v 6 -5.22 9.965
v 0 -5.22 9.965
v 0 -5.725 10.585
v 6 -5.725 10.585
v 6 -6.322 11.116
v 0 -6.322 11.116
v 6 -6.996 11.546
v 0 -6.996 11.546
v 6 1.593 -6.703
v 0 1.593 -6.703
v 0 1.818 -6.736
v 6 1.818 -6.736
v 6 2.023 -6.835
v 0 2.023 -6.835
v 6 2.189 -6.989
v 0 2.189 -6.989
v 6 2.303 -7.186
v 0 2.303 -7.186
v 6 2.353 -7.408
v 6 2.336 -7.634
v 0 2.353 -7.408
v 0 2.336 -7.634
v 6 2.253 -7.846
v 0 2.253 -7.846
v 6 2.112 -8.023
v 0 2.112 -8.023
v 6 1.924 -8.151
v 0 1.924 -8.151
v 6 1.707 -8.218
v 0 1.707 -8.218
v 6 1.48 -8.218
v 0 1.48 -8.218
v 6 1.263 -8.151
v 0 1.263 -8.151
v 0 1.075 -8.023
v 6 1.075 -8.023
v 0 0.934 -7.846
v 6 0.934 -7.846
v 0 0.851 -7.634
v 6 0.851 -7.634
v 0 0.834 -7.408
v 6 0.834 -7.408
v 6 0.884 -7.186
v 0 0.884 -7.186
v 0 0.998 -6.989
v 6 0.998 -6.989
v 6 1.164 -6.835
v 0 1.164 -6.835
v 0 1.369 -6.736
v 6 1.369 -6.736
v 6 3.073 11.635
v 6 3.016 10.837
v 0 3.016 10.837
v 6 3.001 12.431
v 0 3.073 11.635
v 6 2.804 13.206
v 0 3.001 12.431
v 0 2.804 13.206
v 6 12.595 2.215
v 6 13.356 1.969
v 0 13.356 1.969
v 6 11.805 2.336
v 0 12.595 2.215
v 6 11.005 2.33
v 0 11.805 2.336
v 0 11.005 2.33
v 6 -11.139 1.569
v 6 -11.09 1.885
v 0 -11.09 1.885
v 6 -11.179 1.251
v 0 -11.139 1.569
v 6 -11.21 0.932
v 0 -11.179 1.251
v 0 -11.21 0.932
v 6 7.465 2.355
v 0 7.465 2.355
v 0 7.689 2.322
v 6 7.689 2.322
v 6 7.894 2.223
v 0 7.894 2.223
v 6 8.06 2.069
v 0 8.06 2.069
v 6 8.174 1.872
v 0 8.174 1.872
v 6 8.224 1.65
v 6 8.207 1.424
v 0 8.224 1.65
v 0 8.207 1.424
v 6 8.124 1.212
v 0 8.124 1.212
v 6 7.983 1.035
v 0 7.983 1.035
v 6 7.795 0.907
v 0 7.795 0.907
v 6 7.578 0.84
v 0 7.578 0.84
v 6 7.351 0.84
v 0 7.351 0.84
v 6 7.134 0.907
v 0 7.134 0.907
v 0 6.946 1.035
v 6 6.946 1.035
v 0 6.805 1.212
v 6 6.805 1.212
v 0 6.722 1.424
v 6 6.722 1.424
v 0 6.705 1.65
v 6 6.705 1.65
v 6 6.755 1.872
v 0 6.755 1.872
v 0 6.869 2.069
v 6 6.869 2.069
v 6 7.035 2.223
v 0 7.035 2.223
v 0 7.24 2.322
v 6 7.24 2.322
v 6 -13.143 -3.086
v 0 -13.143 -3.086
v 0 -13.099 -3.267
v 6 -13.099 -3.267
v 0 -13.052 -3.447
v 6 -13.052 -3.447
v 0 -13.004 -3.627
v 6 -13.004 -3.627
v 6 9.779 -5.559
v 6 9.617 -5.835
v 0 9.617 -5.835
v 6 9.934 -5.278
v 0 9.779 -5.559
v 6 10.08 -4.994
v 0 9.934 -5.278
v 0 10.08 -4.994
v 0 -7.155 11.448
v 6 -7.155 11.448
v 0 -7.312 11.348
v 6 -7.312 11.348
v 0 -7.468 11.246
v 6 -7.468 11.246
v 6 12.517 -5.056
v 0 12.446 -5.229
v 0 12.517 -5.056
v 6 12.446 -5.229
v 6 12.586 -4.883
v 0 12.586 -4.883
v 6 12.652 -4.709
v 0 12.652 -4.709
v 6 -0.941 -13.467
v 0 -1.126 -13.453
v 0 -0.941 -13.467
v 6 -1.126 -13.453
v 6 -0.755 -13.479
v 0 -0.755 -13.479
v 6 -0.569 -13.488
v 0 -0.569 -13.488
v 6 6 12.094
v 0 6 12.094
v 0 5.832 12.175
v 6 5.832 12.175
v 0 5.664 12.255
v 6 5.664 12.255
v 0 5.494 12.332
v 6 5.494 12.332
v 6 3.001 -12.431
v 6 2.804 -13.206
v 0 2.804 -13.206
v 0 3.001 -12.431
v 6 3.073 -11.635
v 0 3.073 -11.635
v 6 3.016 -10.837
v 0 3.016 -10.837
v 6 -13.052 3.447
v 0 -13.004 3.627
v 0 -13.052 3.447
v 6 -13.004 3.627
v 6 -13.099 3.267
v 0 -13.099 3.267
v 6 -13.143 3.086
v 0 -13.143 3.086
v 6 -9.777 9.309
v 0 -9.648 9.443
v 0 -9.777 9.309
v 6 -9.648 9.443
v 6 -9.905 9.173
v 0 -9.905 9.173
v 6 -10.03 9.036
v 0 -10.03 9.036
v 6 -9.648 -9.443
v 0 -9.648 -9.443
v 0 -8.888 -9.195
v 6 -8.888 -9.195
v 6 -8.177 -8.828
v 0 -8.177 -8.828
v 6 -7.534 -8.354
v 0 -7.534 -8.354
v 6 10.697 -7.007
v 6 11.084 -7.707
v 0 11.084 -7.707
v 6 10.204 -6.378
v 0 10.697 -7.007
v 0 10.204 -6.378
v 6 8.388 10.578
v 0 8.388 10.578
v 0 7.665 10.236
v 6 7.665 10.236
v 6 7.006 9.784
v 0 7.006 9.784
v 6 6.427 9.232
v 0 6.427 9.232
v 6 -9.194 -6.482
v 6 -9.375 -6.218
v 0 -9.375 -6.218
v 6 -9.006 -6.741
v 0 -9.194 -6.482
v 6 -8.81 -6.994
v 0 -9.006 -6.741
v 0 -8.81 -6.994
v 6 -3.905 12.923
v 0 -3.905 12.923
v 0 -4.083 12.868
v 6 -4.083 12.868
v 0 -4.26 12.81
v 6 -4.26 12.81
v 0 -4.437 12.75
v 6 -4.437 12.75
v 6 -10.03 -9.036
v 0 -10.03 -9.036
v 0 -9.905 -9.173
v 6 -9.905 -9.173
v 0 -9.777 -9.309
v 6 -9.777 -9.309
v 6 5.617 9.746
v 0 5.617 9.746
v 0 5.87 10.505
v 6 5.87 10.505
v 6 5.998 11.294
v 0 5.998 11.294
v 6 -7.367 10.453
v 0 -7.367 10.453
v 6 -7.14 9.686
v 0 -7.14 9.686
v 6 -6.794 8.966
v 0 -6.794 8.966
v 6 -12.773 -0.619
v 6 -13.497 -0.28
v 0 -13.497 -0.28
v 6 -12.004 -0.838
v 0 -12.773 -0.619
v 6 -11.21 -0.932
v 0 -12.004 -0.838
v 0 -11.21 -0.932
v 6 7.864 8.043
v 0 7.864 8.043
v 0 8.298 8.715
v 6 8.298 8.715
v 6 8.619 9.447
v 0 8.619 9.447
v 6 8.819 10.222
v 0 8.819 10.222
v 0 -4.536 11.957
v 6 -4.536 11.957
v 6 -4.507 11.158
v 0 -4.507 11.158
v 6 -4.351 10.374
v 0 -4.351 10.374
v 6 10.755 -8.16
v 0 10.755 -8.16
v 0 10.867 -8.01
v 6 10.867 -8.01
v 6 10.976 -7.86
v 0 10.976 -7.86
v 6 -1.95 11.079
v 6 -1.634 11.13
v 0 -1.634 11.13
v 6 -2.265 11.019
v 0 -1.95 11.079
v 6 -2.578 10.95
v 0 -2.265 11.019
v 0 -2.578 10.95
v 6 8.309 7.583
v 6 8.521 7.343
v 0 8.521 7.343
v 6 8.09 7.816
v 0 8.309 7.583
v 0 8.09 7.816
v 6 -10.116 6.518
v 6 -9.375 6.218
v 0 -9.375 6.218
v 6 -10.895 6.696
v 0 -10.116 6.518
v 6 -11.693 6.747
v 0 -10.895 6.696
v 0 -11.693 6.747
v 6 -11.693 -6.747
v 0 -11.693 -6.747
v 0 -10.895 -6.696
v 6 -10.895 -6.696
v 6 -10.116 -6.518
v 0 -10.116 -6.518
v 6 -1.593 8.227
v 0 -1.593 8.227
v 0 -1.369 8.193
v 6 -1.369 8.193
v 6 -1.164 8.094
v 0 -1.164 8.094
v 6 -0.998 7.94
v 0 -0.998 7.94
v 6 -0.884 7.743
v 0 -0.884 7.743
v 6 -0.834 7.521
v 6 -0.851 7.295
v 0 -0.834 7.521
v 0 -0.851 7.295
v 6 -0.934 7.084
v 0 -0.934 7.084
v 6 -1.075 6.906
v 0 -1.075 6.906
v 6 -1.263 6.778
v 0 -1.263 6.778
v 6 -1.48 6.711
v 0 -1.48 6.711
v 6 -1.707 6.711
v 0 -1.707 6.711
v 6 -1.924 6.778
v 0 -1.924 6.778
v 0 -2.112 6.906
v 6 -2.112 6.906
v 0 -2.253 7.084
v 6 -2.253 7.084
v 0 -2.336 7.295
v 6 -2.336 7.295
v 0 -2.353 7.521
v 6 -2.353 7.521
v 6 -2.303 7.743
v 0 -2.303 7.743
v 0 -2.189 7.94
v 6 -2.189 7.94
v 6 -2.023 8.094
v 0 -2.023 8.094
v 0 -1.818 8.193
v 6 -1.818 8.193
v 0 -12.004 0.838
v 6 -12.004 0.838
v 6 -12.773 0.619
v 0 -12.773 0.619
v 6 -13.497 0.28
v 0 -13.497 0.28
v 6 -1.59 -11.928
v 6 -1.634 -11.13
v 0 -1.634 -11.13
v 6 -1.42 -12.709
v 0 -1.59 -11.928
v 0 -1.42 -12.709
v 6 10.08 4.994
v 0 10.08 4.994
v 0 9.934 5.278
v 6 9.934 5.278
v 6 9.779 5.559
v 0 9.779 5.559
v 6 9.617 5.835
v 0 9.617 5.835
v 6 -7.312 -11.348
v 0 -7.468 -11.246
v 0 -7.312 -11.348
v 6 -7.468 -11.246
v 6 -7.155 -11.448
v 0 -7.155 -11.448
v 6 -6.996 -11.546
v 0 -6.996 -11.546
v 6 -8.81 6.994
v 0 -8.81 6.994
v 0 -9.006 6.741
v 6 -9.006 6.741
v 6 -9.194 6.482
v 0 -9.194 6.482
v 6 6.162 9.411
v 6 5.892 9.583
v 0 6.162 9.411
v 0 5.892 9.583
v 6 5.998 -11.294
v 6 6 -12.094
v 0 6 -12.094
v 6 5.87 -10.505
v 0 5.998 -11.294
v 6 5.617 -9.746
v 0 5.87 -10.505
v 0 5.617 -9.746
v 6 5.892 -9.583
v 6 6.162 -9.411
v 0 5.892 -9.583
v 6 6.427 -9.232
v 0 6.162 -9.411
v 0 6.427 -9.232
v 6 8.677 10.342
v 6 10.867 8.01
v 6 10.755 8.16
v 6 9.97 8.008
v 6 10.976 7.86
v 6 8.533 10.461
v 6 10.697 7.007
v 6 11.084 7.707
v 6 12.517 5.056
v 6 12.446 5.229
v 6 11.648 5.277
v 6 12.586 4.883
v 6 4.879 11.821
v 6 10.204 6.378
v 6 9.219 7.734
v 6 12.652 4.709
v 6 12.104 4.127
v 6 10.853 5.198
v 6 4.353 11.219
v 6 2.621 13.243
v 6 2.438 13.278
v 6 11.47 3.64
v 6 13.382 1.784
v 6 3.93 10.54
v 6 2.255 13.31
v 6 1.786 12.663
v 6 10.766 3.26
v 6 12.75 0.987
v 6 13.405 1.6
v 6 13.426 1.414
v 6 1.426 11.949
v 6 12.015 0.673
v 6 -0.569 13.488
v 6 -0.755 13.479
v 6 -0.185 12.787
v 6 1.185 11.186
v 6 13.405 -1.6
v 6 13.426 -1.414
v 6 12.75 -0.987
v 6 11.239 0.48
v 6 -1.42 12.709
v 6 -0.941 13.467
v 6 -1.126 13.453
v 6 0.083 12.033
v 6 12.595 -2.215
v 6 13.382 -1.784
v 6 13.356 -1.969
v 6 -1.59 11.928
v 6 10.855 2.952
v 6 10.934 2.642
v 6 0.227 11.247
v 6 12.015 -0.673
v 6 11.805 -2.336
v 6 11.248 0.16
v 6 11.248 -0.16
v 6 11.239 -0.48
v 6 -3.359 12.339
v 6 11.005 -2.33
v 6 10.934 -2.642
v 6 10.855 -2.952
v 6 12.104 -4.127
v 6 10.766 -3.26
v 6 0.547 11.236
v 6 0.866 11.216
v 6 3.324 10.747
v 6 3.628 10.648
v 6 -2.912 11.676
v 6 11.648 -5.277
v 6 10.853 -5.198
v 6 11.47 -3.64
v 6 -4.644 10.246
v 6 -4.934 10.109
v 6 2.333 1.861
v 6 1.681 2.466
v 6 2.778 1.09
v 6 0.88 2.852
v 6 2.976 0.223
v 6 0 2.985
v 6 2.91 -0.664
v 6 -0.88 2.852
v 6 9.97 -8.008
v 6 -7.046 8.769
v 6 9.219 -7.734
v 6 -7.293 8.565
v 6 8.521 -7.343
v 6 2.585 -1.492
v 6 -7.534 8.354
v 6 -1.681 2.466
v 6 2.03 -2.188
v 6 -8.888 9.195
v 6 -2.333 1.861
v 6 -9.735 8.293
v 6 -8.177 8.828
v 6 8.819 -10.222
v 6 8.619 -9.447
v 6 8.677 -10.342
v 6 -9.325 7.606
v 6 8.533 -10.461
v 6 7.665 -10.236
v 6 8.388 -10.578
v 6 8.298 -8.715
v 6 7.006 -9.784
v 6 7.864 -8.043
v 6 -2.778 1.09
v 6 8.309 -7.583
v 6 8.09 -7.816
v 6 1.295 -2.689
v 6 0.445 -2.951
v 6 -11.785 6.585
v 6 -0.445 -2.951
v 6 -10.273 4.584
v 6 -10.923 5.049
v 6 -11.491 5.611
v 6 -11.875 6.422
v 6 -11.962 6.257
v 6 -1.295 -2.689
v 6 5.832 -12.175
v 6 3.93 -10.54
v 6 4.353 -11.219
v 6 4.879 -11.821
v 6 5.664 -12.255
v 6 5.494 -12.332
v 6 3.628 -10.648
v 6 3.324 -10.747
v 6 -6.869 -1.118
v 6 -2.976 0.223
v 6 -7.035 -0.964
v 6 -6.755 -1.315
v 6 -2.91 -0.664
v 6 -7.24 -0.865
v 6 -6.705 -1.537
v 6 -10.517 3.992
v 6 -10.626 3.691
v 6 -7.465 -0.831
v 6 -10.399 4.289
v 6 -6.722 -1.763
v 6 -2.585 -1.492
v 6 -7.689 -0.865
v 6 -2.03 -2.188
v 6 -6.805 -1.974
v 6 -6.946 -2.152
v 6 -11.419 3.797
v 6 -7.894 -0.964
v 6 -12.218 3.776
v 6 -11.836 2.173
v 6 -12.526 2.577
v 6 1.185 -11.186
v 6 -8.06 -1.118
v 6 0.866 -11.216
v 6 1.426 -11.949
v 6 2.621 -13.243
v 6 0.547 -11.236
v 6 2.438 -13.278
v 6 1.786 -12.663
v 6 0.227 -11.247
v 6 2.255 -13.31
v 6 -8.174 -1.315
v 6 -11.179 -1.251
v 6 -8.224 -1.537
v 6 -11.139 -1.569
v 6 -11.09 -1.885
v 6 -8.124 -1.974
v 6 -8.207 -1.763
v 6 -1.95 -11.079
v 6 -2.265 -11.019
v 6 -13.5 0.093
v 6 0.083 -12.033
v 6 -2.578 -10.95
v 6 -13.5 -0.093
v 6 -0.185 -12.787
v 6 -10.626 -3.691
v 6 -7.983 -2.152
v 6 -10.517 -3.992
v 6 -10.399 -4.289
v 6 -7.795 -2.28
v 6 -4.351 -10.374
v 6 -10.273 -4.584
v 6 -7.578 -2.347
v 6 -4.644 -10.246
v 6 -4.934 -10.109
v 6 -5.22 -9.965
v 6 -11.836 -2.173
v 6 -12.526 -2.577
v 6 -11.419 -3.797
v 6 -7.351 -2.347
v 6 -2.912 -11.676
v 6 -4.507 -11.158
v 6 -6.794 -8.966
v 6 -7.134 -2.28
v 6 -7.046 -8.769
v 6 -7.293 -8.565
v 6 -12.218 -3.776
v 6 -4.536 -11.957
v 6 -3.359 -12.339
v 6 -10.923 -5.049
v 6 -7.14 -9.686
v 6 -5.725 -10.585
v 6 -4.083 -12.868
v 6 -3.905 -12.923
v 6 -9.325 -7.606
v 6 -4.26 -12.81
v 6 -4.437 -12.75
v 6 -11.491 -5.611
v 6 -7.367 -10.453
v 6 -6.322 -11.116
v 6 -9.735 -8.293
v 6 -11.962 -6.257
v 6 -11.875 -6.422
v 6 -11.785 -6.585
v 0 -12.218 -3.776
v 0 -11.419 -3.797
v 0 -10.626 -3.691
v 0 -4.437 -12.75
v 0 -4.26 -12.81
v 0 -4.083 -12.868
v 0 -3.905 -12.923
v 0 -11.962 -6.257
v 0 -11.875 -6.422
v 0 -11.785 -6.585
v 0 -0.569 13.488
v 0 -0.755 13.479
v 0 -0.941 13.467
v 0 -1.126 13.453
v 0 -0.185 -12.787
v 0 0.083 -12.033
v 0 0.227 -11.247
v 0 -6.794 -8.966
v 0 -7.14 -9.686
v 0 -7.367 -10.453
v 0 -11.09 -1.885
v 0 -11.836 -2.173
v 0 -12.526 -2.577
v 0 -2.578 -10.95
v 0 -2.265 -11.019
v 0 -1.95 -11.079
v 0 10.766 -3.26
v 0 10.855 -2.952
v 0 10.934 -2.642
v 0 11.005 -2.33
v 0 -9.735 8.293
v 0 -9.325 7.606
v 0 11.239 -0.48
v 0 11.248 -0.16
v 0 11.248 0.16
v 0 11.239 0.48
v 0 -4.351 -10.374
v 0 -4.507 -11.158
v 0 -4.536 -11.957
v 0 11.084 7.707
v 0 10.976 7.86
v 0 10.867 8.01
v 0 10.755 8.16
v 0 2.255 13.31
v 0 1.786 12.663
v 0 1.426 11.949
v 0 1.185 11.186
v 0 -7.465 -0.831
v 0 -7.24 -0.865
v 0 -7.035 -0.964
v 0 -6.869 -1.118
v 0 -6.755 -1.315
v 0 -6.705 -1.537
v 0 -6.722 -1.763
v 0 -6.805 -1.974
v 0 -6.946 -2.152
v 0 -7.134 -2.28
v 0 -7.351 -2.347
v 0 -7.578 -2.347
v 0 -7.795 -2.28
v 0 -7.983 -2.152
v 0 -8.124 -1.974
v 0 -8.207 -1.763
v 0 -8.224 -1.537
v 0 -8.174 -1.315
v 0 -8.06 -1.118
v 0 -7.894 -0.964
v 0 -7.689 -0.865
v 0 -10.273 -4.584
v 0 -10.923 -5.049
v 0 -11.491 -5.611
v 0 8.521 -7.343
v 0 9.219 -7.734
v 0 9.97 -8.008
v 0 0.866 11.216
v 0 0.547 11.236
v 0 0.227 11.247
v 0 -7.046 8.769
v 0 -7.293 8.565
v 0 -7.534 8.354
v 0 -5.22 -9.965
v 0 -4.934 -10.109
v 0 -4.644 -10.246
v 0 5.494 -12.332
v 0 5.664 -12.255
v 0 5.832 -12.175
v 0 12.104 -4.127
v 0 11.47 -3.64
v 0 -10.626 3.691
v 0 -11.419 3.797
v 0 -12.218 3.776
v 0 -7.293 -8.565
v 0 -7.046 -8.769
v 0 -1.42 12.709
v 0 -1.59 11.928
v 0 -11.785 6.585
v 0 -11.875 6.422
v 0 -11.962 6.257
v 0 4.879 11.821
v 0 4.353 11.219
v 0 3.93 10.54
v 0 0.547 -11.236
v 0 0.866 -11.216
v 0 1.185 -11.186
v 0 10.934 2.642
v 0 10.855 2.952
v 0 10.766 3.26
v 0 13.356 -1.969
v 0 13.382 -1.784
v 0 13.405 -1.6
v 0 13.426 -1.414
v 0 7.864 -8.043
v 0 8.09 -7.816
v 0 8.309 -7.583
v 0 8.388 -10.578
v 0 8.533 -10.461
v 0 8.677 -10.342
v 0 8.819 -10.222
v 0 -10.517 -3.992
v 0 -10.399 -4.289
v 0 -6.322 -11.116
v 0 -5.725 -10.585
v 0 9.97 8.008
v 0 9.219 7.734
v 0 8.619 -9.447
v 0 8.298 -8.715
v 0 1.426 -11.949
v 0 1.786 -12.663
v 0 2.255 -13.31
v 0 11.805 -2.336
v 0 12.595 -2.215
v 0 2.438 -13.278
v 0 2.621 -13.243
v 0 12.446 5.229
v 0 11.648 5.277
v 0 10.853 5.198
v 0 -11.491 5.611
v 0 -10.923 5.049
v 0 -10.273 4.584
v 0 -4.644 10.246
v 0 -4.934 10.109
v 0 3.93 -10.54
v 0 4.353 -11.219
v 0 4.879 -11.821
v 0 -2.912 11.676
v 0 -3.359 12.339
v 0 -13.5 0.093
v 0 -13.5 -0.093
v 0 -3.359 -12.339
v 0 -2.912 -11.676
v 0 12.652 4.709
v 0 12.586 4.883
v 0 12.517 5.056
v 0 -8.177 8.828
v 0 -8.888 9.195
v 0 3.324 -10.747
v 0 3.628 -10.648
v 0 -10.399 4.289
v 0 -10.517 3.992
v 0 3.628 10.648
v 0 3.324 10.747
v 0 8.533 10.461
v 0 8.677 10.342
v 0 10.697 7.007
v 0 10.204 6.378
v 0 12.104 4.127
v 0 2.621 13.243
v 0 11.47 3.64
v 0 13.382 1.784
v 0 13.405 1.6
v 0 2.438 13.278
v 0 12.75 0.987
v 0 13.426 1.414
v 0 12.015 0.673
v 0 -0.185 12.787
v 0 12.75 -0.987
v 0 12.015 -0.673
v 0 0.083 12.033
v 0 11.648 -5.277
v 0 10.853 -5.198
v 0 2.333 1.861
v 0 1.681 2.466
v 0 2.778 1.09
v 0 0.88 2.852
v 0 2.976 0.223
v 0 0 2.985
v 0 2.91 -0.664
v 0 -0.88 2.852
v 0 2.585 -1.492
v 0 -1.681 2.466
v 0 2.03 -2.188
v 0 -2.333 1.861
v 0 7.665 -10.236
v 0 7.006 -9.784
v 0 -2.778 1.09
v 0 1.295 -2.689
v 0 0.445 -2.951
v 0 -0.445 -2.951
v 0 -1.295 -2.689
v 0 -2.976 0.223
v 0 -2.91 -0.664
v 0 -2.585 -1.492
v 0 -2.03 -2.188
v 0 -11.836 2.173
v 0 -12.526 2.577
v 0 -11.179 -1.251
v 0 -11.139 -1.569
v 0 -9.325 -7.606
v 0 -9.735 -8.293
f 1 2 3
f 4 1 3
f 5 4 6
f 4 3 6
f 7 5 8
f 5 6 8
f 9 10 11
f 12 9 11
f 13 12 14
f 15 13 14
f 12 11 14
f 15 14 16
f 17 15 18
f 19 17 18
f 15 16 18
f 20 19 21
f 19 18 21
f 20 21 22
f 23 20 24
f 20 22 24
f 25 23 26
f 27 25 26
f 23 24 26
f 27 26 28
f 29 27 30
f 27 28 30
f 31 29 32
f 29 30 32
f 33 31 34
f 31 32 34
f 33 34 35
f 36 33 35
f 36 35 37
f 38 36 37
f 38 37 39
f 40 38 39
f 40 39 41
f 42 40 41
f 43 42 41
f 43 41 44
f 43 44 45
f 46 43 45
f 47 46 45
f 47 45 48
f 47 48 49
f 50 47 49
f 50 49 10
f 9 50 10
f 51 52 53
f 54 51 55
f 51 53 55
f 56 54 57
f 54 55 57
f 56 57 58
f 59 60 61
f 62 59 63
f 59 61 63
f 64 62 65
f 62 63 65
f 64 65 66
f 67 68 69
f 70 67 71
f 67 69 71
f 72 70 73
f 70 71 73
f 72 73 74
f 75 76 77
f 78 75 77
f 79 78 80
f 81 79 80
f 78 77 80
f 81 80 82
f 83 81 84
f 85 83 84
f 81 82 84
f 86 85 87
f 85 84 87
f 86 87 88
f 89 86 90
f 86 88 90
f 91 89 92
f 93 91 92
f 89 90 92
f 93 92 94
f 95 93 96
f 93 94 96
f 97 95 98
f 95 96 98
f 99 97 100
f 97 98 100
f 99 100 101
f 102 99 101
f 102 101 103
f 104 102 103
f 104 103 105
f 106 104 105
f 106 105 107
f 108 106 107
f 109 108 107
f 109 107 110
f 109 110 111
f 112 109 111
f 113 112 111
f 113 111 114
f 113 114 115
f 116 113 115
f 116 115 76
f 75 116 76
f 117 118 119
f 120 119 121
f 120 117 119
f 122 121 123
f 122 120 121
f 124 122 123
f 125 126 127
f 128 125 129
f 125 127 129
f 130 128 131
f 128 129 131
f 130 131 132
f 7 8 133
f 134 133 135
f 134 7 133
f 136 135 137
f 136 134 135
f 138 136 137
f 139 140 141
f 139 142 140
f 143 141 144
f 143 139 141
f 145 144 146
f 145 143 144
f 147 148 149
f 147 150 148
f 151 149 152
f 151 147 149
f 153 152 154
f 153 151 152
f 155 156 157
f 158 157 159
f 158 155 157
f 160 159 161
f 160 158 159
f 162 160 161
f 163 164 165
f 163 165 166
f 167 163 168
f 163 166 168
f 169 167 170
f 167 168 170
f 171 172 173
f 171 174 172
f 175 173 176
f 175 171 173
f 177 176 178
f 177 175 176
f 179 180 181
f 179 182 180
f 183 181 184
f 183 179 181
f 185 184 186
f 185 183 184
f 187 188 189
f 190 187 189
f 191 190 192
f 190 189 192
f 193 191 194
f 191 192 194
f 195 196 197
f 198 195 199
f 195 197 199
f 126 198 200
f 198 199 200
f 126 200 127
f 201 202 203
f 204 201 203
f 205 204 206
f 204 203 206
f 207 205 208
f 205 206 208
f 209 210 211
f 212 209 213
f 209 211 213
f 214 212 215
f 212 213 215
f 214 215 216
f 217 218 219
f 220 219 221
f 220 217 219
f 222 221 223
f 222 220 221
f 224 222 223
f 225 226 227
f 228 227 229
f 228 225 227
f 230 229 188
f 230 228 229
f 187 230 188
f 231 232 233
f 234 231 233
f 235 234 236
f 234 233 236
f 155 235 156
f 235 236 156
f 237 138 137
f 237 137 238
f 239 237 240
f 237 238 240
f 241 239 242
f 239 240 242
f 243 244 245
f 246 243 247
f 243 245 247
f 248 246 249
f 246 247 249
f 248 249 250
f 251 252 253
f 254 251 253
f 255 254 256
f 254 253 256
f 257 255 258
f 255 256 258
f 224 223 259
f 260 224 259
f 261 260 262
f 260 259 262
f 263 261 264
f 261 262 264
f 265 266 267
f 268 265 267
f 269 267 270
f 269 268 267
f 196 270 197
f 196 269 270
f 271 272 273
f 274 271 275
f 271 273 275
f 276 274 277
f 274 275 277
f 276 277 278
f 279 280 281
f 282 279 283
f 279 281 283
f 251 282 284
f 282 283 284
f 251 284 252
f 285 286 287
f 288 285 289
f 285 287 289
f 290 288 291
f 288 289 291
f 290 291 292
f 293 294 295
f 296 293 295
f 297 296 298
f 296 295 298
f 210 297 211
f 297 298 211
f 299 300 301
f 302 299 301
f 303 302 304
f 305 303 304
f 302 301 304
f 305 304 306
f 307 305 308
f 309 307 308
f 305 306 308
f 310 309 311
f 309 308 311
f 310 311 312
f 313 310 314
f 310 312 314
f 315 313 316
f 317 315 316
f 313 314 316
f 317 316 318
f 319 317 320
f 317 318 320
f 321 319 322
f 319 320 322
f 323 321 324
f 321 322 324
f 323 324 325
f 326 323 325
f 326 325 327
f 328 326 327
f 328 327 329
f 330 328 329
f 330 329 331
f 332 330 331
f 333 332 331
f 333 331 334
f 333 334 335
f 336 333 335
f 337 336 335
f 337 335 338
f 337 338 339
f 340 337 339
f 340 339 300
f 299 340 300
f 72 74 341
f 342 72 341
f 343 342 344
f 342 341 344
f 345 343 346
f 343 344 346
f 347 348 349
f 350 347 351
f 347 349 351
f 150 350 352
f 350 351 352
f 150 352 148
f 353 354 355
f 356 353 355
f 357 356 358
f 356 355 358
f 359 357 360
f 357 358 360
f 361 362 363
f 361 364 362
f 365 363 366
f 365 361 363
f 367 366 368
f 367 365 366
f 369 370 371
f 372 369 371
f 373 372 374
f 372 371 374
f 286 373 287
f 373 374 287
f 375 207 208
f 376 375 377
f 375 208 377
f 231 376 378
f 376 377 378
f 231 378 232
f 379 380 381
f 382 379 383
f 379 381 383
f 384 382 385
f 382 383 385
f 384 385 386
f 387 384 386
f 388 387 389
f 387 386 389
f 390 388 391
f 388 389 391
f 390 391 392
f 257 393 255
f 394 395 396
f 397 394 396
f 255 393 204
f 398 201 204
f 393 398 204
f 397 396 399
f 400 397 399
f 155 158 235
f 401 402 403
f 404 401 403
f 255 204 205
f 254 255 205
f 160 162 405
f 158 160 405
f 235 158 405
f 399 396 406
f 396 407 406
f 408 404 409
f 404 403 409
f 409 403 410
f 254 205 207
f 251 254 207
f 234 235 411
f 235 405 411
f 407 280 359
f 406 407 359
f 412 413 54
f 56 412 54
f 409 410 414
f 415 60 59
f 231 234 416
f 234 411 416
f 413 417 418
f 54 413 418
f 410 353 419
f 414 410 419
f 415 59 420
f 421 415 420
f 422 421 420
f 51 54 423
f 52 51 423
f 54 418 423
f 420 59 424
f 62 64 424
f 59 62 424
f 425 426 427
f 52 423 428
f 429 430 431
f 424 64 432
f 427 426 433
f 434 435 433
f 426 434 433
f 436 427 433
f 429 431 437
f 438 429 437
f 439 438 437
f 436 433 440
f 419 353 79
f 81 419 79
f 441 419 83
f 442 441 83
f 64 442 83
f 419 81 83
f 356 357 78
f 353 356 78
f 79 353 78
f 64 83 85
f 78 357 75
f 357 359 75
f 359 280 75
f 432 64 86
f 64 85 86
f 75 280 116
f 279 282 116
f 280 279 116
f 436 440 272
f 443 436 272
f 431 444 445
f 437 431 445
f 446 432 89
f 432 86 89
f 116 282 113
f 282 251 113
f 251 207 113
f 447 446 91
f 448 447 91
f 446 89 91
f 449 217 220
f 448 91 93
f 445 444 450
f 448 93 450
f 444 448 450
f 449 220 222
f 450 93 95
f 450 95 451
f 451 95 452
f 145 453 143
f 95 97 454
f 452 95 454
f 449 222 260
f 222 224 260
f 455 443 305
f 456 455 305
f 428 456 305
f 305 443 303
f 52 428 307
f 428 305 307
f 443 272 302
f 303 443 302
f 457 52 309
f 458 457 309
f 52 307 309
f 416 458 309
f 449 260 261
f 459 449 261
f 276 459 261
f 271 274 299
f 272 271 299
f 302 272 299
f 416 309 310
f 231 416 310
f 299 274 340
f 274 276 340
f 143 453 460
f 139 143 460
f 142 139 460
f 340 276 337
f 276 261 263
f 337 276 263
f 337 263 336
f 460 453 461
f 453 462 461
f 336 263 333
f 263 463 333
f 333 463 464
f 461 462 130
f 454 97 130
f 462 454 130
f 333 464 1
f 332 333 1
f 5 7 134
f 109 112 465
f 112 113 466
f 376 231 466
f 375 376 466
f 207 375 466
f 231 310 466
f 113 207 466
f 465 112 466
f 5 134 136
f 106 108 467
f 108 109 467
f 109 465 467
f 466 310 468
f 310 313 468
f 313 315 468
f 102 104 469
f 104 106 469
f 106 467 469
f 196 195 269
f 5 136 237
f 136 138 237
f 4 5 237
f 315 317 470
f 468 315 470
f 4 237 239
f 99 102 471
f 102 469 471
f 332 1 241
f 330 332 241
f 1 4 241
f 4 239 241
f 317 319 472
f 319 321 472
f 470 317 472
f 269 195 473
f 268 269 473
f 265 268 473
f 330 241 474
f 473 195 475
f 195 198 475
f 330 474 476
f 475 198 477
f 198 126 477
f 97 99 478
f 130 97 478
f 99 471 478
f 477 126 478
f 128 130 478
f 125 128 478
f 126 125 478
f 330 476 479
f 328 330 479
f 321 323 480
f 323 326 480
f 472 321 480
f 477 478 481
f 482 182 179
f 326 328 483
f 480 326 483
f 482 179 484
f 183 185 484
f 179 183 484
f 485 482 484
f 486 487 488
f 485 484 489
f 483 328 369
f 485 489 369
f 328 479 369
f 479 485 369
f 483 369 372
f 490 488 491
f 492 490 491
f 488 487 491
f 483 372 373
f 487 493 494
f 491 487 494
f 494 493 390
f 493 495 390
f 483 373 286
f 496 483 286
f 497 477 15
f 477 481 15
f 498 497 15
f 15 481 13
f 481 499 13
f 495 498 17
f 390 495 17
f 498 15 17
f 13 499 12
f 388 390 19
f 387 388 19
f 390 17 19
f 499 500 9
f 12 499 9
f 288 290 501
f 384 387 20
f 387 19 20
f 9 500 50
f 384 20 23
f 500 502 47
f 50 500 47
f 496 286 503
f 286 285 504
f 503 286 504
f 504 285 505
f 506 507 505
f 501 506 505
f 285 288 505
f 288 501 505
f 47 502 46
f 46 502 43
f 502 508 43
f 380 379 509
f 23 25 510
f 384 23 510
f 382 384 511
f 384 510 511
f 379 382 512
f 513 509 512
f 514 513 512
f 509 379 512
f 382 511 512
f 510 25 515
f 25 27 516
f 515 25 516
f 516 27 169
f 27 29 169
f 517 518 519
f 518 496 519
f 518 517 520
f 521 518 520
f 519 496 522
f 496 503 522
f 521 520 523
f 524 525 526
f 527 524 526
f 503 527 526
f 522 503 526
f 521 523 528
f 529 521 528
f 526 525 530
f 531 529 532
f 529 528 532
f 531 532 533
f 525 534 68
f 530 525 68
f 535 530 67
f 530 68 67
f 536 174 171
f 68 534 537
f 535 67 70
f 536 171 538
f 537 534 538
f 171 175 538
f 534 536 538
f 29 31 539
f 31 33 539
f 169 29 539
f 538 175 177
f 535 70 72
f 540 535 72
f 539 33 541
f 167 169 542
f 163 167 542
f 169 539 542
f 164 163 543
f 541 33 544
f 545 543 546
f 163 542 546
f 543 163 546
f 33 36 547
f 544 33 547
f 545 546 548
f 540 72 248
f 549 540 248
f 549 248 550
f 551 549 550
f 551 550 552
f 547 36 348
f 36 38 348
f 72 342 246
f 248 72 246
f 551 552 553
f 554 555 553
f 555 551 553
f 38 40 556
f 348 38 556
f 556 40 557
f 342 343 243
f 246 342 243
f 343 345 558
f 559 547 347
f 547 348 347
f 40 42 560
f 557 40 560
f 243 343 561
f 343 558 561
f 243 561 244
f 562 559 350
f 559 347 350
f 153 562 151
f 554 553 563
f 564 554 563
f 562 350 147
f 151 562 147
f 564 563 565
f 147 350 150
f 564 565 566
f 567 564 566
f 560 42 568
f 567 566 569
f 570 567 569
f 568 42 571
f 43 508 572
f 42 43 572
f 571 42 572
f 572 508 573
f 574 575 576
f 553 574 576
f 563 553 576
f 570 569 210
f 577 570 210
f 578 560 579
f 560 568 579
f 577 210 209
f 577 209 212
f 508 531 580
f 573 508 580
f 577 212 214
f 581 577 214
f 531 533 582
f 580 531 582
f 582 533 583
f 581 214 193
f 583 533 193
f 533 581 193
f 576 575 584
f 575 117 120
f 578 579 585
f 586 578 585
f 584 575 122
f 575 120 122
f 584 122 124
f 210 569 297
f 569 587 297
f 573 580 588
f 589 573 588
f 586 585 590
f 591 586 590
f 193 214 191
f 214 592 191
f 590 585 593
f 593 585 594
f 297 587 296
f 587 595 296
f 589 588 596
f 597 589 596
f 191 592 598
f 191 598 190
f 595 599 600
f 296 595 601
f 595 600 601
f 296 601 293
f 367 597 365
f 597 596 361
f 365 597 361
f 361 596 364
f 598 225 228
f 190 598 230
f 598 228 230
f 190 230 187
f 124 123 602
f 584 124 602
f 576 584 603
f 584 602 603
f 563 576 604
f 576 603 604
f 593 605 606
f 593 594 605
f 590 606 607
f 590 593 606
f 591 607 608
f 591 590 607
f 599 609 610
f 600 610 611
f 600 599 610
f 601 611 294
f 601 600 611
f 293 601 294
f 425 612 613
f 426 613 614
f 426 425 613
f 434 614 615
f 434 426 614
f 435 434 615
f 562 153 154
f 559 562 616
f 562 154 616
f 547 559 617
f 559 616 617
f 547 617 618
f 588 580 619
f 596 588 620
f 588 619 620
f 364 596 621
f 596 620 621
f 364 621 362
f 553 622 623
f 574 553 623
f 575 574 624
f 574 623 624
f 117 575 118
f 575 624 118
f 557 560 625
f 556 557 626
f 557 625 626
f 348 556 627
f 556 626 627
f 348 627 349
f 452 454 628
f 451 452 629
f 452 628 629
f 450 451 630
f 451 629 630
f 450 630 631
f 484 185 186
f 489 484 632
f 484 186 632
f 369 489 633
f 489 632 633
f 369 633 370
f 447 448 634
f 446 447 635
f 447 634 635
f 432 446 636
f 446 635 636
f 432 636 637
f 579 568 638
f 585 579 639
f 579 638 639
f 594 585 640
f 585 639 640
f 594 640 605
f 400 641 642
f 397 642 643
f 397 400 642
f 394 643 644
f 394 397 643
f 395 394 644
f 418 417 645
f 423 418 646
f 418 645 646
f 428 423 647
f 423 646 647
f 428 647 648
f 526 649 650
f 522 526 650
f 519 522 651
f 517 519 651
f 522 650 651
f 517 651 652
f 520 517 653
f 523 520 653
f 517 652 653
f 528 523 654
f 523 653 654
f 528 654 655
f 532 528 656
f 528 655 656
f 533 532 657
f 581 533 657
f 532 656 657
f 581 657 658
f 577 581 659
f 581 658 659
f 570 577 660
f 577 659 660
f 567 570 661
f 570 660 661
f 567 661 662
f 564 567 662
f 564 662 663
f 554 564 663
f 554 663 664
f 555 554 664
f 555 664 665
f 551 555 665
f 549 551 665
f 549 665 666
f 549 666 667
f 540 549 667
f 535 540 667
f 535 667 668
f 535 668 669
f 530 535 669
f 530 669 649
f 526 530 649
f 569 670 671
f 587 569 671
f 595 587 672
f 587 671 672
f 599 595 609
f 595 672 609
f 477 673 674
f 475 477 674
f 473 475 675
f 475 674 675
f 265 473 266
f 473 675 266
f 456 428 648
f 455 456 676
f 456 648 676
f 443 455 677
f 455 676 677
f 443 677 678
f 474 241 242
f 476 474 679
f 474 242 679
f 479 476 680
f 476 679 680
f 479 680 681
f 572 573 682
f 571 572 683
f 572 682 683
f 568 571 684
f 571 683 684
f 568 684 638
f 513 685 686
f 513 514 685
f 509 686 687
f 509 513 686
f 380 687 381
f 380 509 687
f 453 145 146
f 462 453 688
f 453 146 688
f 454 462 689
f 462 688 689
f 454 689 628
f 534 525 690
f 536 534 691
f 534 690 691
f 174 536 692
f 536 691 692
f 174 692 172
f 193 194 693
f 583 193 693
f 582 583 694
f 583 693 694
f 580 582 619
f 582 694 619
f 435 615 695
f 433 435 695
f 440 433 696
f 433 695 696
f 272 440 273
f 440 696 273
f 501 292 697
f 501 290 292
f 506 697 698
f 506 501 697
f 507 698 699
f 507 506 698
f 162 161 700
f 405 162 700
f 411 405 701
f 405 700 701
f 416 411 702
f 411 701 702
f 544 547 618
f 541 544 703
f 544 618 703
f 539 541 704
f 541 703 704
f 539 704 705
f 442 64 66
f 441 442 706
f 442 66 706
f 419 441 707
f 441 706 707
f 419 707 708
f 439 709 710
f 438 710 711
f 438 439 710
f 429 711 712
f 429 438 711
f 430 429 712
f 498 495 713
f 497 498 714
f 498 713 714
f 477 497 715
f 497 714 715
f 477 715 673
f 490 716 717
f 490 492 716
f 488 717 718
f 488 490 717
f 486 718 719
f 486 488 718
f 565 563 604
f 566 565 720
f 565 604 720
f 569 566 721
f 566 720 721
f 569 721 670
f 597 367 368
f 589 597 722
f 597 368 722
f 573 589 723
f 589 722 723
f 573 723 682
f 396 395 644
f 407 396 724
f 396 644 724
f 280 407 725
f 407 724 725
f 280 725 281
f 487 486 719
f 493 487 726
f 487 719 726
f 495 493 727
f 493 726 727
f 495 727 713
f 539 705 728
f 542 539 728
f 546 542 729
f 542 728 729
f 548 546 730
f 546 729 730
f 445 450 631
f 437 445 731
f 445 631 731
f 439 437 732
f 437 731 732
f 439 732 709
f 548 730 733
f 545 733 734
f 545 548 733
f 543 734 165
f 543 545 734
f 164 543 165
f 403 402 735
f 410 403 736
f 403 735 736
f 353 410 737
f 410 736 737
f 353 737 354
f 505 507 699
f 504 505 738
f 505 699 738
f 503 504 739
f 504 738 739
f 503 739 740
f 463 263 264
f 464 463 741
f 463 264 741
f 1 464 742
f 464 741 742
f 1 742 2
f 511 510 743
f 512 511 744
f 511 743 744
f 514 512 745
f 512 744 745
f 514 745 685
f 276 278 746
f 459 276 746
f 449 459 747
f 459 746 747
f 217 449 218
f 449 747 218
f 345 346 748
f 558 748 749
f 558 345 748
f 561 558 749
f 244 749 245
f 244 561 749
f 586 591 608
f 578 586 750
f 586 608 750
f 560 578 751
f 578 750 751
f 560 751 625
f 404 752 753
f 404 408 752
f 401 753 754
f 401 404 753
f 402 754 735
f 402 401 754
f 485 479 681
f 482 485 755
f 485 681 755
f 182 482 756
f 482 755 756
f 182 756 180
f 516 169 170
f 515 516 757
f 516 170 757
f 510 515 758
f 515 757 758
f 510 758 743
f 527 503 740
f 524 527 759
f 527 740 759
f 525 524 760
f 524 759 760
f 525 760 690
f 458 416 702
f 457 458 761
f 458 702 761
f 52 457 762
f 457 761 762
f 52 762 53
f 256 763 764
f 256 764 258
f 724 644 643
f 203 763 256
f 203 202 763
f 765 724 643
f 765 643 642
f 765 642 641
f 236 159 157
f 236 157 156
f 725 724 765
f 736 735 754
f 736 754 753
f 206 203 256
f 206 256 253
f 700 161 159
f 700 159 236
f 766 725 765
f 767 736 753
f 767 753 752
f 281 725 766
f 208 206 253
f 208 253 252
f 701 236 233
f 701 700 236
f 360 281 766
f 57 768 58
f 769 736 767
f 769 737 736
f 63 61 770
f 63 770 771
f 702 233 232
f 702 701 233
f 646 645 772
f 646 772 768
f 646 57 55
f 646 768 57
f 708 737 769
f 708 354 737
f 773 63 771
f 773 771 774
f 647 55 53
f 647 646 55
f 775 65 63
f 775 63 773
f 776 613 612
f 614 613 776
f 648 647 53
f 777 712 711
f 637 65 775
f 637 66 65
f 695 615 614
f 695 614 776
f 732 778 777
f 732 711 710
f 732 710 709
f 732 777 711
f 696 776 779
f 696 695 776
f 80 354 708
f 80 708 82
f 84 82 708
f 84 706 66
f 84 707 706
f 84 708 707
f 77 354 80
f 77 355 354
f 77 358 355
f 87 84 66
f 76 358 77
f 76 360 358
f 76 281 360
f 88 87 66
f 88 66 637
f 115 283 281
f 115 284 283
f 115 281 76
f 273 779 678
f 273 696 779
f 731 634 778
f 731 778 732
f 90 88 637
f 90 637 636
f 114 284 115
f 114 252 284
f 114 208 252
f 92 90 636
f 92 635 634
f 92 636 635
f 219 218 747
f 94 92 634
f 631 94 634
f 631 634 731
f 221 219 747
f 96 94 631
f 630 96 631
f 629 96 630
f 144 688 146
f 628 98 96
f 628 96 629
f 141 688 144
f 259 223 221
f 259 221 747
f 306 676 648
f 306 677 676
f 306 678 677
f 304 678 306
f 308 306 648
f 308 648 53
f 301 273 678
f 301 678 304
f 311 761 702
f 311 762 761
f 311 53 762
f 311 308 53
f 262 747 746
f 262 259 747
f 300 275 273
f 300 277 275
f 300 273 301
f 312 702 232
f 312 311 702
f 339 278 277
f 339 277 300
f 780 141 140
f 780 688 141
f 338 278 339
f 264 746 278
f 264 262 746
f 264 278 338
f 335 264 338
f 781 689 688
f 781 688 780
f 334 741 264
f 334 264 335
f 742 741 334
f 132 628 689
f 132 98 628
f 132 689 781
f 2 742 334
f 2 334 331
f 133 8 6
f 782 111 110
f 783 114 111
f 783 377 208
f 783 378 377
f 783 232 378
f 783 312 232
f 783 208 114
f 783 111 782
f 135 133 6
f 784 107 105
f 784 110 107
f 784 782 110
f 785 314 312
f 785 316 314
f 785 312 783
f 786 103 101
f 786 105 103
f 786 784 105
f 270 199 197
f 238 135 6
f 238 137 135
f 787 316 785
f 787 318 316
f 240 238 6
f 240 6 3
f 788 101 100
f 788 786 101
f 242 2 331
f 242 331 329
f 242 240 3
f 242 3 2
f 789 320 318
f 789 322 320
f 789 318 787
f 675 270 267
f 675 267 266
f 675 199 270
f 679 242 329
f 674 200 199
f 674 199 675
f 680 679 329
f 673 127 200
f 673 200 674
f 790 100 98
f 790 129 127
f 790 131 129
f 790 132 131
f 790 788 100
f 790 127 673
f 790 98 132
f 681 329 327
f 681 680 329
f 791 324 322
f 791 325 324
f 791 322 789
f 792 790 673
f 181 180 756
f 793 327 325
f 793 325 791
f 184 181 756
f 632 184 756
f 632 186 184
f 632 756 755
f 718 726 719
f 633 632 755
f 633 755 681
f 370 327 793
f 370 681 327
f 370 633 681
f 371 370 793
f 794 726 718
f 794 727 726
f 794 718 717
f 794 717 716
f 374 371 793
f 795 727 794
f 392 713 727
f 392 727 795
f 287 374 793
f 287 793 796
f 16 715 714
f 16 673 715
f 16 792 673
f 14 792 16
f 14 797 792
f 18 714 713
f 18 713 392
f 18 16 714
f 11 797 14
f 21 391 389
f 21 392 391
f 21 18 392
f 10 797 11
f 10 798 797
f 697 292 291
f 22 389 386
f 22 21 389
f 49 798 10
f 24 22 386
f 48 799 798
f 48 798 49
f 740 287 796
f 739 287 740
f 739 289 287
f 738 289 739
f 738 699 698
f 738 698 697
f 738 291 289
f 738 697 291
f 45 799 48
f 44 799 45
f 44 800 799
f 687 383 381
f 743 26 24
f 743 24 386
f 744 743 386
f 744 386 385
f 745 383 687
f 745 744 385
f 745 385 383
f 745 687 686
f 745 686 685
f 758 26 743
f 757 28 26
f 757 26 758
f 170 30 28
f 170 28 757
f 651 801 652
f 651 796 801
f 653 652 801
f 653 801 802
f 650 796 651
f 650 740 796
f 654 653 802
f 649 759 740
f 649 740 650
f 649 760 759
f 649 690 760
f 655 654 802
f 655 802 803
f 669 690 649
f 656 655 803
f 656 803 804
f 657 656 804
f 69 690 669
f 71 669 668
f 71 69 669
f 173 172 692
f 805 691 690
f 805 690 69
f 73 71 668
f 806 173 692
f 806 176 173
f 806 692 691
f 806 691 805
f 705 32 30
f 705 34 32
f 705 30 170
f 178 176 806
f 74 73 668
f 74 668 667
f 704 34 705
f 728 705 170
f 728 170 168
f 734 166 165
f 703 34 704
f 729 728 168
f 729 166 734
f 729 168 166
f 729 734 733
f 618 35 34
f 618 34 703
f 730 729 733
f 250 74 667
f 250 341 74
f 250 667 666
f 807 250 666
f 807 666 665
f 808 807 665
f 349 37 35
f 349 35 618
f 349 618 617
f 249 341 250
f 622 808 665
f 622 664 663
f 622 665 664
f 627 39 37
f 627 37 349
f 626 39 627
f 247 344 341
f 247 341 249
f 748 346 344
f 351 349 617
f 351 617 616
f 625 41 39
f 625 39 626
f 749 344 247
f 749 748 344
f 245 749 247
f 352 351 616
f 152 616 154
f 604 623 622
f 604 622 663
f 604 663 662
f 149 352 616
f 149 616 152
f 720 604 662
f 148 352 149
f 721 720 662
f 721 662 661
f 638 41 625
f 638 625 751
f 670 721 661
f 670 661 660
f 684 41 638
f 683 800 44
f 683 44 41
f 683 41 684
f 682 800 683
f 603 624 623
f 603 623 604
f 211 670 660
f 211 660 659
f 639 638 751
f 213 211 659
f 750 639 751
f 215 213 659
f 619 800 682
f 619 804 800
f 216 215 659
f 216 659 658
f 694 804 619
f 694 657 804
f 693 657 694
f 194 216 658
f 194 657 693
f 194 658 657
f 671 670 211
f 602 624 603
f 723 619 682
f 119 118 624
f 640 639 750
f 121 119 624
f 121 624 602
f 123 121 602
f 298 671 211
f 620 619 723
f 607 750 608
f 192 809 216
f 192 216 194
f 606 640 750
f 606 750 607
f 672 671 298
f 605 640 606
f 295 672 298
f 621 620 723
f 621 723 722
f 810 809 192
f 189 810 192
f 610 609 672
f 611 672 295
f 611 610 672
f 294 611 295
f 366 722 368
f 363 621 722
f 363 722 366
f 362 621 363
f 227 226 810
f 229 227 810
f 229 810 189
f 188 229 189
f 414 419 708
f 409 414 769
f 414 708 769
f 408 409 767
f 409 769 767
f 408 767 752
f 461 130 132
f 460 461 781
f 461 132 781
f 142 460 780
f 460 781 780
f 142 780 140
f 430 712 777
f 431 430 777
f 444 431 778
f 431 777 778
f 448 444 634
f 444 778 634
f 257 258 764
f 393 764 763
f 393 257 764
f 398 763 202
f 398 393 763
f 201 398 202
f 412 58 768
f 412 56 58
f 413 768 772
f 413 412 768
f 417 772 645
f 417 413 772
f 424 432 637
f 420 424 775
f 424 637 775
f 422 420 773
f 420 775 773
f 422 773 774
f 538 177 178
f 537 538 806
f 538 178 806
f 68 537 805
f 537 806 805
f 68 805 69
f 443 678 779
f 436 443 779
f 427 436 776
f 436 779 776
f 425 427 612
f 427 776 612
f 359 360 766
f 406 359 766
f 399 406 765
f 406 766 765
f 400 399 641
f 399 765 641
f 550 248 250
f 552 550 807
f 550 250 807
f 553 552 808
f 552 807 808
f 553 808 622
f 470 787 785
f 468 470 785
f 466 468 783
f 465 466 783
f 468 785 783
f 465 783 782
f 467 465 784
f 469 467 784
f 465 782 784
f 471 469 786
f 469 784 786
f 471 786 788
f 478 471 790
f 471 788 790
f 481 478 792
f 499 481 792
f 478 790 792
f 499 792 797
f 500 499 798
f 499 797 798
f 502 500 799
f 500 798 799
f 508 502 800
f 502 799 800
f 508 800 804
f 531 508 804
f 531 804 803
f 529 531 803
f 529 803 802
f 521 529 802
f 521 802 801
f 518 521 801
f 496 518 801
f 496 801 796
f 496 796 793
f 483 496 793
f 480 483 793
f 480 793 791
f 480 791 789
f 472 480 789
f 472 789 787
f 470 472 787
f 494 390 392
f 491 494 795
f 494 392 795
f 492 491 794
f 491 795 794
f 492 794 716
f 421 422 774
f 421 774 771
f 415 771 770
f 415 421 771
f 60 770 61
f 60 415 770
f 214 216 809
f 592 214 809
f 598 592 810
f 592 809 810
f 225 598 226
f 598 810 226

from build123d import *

# Parameters (mm, degrees)
BASPROSKE_W        = 6
BASPROSKE_H        = 13.5
TOOTHCUT_DEPTH     = 21.012496096
TEETHCUTS_COUNT    = 25
TEETHCUTS_ANGLE    = 345.6
BORSKE_R           = 2.5
BORE_DEPTH         = 50.0000508
SKETCH1_R          = 0.762
SKETCH1_R_2        = 2.9845
SKETCH1_R_3        = 2.5
CUT_EXTRUDE1_DEPTH = 149.550528118


with BuildPart() as part:
    # BasProSke → Base-Revolve (revolve)
    with BuildSketch(Plane(origin=(0, 0, 0), x_dir=(1, 0, 0), z_dir=(0, 1, 0)), mode=Mode.PRIVATE) as base_revolve_sk:
        with Locations((3, 6.75)):
            Rectangle(BASPROSKE_W, BASPROSKE_H)
    revolve(base_revolve_sk.sketch.rotate(Axis((-10, 0, 0), (1, 0, 0)), 180), axis=Axis((-10, 0, 0), (1, 0, 0)))

    # TooCutSke → ToothCut (cut, through all)
    with BuildSketch(Plane(origin=(0, 0, 0), x_dir=(0, 0, -1), z_dir=(1, 0, 0))):
        with BuildLine():
            ThreePointArc((0.480087995, 11.238750665), (0, 11.249), (-0.480087995, 11.238750665))
            ThreePointArc((-0.480087995, 11.238750665), (-0.821124963, 12.40220054), (-1.432168974, 13.449361962))
            ThreePointArc((-1.432168974, 13.449361962), (0, 13.5254), (1.432168974, 13.449361962))
            ThreePointArc((1.432168974, 13.449361962), (0.821124963, 12.40220054), (0.480087995, 11.238750665))
        make_face()
    toothcut = extrude(amount=TOOTHCUT_DEPTH, mode=Mode.SUBTRACT)

    # TeethCuts: ToothCut ×25 about axis
    teethcuts_axis = Axis((-10, 0, 0), (1, 0, 0))
    for i in range(1, TEETHCUTS_COUNT):
        add(toothcut.rotate(teethcuts_axis, i * TEETHCUTS_ANGLE / (TEETHCUTS_COUNT - 1)), mode=Mode.SUBTRACT)

    # BorSke → Bore (cut, symmetric)
    with BuildSketch(Plane(origin=(0, 0, 0), x_dir=(0, 0, -1), z_dir=(1, 0, 0))):
        with Locations(Location((0, 0, 0), (0, 0, 180))):
            Circle(BORSKE_R)
    extrude(amount=BORE_DEPTH, both=True, mode=Mode.SUBTRACT)

    # Sketch1 → Cut-Extrude1 (cut, through all)
    # profile 1 of 5: a face of its own
    with BuildSketch(Plane(origin=(0, -120.077012647, 51.383248755), x_dir=(0, 0.18176265719649715, 0.9833424309206171), z_dir=(-1, 0, 0))):
        with Locations(Location((-21.651272984, 124.49267918, 0), (0, 0, 349.527553538))):
            Circle(SKETCH1_R)
    # profile 2 of 5: a face of its own
    with BuildSketch(Plane(origin=(0, -120.077012647, 51.383248755), x_dir=(0, 0.18176265719649715, 0.9833424309206171), z_dir=(-1, 0, 0))):
        with Locations(Location((-25.778113688, 134.466916212, 0), (0, 0, 349.527553538))):
            Circle(SKETCH1_R)
    # profile 3 of 5: a face of its own
    with BuildSketch(Plane(origin=(0, -120.077012647, 51.383248755), x_dir=(0, 0.18176265719649715, 0.9833424309206171), z_dir=(-1, 0, 0))):
        with Locations(Location((-35.752350721, 130.340075507, 0), (0, 0, 349.527553538))):
            Circle(SKETCH1_R)
    # profile 4 of 5: a face of its own
    with BuildSketch(Plane(origin=(0, -120.077012647, 51.383248755), x_dir=(0, 0.18176265719649715, 0.9833424309206171), z_dir=(-1, 0, 0))):
        with Locations(Location((-31.625510016, 120.365838475, 0), (0, 0, 349.527553538))):
            Circle(SKETCH1_R)
    # profile 5 of 5: a face of its own
    with BuildSketch(Plane(origin=(0, -120.077012647, 51.383248755), x_dir=(0, 0.18176265719649715, 0.9833424309206171), z_dir=(-1, 0, 0))):
        with Locations(Location((-28.701811852, 127.416377343, 0), (0, 0, 349.527553538))):
            Circle(SKETCH1_R_2)
        with Locations((-28.701811852, 127.416377343)):
            Circle(SKETCH1_R_3, mode=Mode.SUBTRACT)
    extrude(amount=-CUT_EXTRUDE1_DEPTH, mode=Mode.SUBTRACT)


solid = part.part
